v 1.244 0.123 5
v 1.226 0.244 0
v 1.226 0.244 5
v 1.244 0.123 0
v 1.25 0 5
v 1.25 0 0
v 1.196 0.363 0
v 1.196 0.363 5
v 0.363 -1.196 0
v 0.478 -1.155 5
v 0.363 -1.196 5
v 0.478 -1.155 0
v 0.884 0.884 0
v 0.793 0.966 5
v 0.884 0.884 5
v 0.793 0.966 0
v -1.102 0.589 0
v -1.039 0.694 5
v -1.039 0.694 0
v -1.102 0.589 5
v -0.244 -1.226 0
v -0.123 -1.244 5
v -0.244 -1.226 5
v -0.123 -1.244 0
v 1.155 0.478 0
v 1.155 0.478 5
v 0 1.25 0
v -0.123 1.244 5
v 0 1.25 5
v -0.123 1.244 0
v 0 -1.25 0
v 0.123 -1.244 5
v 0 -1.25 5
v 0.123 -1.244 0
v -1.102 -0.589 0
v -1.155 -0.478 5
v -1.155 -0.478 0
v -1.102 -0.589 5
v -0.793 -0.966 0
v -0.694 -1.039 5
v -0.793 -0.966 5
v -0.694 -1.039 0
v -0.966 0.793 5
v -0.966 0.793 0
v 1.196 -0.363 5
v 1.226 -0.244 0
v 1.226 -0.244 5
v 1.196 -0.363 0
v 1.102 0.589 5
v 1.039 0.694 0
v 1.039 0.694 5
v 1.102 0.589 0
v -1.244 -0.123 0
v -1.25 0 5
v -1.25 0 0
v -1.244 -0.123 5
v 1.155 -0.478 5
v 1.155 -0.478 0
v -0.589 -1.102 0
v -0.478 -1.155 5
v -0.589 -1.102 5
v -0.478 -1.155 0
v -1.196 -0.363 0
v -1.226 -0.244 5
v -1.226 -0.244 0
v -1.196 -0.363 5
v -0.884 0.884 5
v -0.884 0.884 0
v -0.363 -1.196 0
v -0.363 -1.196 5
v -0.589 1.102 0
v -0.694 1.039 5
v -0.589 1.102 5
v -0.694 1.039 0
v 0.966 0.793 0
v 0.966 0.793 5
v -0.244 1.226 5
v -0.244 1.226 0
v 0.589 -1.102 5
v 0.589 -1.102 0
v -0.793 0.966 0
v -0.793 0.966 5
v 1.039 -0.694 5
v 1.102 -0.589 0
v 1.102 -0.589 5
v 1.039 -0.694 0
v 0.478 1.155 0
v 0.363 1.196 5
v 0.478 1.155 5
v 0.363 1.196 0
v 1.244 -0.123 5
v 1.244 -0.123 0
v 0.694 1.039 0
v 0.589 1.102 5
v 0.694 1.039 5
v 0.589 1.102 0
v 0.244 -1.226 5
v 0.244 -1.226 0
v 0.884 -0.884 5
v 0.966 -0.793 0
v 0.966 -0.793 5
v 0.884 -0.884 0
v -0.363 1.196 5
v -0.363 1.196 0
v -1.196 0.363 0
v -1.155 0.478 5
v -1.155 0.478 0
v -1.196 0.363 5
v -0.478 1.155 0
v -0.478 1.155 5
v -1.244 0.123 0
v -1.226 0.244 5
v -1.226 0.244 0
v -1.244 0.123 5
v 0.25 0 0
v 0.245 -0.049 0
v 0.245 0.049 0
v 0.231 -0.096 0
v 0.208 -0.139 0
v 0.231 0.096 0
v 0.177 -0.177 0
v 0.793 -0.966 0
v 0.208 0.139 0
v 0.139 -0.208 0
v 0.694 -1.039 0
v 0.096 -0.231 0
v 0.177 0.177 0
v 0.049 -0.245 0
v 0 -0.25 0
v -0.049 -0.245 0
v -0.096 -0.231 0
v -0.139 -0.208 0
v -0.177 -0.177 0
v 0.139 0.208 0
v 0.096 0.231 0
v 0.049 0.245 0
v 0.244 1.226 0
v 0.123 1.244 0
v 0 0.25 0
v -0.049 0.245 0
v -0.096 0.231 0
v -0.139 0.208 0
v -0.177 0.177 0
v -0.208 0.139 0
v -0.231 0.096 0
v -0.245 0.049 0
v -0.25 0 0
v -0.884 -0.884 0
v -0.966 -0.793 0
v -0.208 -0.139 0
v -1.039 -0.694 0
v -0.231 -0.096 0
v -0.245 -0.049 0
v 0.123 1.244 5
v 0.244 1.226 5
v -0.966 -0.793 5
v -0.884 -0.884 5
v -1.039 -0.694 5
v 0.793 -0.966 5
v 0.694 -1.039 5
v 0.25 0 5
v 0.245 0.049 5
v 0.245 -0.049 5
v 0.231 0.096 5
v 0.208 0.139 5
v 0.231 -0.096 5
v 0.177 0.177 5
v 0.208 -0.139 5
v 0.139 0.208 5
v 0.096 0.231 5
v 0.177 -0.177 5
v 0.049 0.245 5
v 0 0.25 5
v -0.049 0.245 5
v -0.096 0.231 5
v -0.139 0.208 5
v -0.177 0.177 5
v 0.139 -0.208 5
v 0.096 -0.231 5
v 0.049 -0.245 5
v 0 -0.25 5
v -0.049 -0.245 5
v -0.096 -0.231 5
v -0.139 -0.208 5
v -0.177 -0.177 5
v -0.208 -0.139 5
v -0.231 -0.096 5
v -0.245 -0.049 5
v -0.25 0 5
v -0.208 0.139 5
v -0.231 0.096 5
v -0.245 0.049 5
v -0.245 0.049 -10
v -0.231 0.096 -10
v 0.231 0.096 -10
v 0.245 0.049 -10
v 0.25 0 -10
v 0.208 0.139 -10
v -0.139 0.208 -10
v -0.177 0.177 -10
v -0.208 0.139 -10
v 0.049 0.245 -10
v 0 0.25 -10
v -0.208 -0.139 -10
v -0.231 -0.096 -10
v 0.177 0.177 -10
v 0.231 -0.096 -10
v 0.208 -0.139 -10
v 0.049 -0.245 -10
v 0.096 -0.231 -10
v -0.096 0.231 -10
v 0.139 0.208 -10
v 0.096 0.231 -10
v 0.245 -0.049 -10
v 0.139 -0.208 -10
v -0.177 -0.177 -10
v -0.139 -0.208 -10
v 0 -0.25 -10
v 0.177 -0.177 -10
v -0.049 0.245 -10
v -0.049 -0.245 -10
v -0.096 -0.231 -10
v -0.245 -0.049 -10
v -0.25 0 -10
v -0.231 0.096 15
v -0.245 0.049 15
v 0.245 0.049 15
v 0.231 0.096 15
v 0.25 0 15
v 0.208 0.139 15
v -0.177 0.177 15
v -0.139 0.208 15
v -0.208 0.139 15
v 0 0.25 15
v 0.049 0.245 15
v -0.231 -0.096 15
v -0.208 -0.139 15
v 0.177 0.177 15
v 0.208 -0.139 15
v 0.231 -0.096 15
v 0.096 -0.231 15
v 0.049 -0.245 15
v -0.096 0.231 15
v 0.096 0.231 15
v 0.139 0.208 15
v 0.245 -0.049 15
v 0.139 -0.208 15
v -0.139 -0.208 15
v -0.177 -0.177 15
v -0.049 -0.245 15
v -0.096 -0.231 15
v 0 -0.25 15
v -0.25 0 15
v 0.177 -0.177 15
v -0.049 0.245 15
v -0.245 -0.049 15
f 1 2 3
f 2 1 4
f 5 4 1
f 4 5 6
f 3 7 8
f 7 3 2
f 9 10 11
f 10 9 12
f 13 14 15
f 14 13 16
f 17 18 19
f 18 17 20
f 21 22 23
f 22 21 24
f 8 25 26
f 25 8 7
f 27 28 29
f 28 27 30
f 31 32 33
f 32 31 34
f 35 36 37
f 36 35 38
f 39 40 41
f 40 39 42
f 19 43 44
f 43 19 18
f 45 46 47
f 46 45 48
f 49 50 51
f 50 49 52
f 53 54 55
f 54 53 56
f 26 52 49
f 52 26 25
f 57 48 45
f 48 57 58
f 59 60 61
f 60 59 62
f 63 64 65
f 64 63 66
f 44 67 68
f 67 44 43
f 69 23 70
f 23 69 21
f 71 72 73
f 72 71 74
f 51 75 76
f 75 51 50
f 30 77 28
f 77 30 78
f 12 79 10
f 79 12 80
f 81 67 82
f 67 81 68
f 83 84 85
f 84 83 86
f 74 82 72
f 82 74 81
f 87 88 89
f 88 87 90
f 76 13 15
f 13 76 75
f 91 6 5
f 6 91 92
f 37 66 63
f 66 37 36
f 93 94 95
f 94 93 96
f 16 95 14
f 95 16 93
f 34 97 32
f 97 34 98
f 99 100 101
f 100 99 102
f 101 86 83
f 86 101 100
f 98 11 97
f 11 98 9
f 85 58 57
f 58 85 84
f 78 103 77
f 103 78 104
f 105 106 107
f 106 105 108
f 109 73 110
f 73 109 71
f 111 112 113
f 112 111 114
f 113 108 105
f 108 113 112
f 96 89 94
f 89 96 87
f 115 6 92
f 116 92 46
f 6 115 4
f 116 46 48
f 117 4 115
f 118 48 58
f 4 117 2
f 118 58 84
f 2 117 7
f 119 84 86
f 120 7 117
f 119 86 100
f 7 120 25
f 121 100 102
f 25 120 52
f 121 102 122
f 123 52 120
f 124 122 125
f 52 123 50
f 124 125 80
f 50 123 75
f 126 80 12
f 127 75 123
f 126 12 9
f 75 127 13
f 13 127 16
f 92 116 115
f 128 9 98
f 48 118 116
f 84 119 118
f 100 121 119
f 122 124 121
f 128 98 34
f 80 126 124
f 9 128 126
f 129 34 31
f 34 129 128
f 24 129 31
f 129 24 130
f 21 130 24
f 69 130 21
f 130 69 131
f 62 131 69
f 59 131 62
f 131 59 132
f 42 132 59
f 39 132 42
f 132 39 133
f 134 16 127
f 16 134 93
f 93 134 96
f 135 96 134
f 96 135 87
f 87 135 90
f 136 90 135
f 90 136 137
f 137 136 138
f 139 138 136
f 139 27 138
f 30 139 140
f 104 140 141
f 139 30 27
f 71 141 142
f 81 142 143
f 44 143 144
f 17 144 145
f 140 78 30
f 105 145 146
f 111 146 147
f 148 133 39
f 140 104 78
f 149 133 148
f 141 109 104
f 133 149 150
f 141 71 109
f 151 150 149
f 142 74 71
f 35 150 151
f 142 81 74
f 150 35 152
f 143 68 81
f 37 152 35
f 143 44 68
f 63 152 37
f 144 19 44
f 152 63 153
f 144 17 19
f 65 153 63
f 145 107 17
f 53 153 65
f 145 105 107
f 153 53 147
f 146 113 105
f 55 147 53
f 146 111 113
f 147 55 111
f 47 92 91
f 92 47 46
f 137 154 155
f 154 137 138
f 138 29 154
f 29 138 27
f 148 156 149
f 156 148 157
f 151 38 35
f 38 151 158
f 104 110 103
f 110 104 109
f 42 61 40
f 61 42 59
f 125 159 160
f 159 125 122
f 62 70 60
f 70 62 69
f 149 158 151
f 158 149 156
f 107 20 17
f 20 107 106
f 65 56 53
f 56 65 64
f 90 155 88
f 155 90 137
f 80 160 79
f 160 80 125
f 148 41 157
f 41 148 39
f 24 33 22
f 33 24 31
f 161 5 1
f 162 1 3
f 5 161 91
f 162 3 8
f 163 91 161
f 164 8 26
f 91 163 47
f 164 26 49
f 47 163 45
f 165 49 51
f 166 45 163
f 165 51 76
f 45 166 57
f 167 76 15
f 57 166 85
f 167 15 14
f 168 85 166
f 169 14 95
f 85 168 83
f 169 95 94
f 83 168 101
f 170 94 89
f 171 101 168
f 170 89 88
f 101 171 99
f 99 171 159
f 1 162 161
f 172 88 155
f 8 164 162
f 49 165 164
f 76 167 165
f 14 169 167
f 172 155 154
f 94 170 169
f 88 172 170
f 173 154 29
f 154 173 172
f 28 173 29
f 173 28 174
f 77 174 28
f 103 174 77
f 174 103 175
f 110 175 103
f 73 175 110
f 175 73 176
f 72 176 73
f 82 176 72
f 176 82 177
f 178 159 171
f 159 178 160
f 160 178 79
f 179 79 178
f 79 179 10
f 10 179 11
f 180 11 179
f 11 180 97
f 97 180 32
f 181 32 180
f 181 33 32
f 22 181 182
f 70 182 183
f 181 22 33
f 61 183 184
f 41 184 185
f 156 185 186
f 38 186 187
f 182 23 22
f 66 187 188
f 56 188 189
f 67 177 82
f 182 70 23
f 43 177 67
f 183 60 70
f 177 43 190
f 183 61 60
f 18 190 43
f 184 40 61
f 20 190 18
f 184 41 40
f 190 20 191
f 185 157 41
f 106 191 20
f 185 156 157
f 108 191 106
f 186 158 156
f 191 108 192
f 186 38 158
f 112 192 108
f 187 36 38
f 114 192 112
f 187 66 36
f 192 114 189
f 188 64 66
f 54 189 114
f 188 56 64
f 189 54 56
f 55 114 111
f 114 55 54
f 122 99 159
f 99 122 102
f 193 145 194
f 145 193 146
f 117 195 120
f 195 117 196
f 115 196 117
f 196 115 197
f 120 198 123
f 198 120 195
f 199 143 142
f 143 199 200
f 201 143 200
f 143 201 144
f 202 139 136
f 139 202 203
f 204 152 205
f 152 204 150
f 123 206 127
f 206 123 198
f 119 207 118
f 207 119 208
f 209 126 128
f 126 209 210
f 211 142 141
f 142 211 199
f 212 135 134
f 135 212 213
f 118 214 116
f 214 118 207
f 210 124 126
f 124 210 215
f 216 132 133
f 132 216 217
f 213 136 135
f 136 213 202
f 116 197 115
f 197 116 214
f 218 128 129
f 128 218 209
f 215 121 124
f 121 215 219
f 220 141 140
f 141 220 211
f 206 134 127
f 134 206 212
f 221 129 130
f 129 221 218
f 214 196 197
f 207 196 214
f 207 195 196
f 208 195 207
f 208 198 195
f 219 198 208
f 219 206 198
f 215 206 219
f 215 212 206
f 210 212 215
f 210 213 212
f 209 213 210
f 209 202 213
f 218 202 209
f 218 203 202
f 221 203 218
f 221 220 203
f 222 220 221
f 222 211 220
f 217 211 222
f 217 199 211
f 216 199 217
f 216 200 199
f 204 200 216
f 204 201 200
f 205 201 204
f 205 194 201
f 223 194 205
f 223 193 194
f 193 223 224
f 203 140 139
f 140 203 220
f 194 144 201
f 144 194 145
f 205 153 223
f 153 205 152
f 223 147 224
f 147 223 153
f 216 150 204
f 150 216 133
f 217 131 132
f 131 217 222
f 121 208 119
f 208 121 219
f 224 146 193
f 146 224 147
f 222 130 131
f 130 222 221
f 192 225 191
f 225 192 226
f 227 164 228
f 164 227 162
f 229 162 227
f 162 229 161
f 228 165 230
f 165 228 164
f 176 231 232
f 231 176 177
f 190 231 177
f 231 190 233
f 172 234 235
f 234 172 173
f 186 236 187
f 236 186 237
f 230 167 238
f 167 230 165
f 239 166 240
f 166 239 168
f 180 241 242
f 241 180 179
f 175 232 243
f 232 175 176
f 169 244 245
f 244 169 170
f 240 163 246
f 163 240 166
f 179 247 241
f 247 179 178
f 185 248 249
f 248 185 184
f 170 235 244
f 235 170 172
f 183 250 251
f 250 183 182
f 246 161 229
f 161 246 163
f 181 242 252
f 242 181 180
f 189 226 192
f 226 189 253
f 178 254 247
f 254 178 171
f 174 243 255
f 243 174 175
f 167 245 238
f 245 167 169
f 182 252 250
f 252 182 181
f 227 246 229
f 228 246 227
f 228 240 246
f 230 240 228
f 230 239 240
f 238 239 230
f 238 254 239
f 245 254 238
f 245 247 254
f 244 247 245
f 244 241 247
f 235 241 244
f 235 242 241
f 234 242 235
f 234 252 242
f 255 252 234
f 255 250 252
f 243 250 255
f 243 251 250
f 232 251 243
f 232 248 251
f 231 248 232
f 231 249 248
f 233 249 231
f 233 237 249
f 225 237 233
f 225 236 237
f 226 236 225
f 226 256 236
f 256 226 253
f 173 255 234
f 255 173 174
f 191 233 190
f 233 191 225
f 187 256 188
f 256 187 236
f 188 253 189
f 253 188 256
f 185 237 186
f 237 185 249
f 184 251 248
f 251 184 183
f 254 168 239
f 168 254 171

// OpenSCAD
module thermistor_honeywell() {
    // Main body of the thermistor
    cylinder(h=5, d=2.5, $fn=64);

    // Leads of the thermistor
    translate([0, 0, -10])
        cylinder(h=10, d=0.5, $fn=32);

    translate([0, 0, 5])
        cylinder(h=10, d=0.5, $fn=32);
}

thermistor_honeywell();
